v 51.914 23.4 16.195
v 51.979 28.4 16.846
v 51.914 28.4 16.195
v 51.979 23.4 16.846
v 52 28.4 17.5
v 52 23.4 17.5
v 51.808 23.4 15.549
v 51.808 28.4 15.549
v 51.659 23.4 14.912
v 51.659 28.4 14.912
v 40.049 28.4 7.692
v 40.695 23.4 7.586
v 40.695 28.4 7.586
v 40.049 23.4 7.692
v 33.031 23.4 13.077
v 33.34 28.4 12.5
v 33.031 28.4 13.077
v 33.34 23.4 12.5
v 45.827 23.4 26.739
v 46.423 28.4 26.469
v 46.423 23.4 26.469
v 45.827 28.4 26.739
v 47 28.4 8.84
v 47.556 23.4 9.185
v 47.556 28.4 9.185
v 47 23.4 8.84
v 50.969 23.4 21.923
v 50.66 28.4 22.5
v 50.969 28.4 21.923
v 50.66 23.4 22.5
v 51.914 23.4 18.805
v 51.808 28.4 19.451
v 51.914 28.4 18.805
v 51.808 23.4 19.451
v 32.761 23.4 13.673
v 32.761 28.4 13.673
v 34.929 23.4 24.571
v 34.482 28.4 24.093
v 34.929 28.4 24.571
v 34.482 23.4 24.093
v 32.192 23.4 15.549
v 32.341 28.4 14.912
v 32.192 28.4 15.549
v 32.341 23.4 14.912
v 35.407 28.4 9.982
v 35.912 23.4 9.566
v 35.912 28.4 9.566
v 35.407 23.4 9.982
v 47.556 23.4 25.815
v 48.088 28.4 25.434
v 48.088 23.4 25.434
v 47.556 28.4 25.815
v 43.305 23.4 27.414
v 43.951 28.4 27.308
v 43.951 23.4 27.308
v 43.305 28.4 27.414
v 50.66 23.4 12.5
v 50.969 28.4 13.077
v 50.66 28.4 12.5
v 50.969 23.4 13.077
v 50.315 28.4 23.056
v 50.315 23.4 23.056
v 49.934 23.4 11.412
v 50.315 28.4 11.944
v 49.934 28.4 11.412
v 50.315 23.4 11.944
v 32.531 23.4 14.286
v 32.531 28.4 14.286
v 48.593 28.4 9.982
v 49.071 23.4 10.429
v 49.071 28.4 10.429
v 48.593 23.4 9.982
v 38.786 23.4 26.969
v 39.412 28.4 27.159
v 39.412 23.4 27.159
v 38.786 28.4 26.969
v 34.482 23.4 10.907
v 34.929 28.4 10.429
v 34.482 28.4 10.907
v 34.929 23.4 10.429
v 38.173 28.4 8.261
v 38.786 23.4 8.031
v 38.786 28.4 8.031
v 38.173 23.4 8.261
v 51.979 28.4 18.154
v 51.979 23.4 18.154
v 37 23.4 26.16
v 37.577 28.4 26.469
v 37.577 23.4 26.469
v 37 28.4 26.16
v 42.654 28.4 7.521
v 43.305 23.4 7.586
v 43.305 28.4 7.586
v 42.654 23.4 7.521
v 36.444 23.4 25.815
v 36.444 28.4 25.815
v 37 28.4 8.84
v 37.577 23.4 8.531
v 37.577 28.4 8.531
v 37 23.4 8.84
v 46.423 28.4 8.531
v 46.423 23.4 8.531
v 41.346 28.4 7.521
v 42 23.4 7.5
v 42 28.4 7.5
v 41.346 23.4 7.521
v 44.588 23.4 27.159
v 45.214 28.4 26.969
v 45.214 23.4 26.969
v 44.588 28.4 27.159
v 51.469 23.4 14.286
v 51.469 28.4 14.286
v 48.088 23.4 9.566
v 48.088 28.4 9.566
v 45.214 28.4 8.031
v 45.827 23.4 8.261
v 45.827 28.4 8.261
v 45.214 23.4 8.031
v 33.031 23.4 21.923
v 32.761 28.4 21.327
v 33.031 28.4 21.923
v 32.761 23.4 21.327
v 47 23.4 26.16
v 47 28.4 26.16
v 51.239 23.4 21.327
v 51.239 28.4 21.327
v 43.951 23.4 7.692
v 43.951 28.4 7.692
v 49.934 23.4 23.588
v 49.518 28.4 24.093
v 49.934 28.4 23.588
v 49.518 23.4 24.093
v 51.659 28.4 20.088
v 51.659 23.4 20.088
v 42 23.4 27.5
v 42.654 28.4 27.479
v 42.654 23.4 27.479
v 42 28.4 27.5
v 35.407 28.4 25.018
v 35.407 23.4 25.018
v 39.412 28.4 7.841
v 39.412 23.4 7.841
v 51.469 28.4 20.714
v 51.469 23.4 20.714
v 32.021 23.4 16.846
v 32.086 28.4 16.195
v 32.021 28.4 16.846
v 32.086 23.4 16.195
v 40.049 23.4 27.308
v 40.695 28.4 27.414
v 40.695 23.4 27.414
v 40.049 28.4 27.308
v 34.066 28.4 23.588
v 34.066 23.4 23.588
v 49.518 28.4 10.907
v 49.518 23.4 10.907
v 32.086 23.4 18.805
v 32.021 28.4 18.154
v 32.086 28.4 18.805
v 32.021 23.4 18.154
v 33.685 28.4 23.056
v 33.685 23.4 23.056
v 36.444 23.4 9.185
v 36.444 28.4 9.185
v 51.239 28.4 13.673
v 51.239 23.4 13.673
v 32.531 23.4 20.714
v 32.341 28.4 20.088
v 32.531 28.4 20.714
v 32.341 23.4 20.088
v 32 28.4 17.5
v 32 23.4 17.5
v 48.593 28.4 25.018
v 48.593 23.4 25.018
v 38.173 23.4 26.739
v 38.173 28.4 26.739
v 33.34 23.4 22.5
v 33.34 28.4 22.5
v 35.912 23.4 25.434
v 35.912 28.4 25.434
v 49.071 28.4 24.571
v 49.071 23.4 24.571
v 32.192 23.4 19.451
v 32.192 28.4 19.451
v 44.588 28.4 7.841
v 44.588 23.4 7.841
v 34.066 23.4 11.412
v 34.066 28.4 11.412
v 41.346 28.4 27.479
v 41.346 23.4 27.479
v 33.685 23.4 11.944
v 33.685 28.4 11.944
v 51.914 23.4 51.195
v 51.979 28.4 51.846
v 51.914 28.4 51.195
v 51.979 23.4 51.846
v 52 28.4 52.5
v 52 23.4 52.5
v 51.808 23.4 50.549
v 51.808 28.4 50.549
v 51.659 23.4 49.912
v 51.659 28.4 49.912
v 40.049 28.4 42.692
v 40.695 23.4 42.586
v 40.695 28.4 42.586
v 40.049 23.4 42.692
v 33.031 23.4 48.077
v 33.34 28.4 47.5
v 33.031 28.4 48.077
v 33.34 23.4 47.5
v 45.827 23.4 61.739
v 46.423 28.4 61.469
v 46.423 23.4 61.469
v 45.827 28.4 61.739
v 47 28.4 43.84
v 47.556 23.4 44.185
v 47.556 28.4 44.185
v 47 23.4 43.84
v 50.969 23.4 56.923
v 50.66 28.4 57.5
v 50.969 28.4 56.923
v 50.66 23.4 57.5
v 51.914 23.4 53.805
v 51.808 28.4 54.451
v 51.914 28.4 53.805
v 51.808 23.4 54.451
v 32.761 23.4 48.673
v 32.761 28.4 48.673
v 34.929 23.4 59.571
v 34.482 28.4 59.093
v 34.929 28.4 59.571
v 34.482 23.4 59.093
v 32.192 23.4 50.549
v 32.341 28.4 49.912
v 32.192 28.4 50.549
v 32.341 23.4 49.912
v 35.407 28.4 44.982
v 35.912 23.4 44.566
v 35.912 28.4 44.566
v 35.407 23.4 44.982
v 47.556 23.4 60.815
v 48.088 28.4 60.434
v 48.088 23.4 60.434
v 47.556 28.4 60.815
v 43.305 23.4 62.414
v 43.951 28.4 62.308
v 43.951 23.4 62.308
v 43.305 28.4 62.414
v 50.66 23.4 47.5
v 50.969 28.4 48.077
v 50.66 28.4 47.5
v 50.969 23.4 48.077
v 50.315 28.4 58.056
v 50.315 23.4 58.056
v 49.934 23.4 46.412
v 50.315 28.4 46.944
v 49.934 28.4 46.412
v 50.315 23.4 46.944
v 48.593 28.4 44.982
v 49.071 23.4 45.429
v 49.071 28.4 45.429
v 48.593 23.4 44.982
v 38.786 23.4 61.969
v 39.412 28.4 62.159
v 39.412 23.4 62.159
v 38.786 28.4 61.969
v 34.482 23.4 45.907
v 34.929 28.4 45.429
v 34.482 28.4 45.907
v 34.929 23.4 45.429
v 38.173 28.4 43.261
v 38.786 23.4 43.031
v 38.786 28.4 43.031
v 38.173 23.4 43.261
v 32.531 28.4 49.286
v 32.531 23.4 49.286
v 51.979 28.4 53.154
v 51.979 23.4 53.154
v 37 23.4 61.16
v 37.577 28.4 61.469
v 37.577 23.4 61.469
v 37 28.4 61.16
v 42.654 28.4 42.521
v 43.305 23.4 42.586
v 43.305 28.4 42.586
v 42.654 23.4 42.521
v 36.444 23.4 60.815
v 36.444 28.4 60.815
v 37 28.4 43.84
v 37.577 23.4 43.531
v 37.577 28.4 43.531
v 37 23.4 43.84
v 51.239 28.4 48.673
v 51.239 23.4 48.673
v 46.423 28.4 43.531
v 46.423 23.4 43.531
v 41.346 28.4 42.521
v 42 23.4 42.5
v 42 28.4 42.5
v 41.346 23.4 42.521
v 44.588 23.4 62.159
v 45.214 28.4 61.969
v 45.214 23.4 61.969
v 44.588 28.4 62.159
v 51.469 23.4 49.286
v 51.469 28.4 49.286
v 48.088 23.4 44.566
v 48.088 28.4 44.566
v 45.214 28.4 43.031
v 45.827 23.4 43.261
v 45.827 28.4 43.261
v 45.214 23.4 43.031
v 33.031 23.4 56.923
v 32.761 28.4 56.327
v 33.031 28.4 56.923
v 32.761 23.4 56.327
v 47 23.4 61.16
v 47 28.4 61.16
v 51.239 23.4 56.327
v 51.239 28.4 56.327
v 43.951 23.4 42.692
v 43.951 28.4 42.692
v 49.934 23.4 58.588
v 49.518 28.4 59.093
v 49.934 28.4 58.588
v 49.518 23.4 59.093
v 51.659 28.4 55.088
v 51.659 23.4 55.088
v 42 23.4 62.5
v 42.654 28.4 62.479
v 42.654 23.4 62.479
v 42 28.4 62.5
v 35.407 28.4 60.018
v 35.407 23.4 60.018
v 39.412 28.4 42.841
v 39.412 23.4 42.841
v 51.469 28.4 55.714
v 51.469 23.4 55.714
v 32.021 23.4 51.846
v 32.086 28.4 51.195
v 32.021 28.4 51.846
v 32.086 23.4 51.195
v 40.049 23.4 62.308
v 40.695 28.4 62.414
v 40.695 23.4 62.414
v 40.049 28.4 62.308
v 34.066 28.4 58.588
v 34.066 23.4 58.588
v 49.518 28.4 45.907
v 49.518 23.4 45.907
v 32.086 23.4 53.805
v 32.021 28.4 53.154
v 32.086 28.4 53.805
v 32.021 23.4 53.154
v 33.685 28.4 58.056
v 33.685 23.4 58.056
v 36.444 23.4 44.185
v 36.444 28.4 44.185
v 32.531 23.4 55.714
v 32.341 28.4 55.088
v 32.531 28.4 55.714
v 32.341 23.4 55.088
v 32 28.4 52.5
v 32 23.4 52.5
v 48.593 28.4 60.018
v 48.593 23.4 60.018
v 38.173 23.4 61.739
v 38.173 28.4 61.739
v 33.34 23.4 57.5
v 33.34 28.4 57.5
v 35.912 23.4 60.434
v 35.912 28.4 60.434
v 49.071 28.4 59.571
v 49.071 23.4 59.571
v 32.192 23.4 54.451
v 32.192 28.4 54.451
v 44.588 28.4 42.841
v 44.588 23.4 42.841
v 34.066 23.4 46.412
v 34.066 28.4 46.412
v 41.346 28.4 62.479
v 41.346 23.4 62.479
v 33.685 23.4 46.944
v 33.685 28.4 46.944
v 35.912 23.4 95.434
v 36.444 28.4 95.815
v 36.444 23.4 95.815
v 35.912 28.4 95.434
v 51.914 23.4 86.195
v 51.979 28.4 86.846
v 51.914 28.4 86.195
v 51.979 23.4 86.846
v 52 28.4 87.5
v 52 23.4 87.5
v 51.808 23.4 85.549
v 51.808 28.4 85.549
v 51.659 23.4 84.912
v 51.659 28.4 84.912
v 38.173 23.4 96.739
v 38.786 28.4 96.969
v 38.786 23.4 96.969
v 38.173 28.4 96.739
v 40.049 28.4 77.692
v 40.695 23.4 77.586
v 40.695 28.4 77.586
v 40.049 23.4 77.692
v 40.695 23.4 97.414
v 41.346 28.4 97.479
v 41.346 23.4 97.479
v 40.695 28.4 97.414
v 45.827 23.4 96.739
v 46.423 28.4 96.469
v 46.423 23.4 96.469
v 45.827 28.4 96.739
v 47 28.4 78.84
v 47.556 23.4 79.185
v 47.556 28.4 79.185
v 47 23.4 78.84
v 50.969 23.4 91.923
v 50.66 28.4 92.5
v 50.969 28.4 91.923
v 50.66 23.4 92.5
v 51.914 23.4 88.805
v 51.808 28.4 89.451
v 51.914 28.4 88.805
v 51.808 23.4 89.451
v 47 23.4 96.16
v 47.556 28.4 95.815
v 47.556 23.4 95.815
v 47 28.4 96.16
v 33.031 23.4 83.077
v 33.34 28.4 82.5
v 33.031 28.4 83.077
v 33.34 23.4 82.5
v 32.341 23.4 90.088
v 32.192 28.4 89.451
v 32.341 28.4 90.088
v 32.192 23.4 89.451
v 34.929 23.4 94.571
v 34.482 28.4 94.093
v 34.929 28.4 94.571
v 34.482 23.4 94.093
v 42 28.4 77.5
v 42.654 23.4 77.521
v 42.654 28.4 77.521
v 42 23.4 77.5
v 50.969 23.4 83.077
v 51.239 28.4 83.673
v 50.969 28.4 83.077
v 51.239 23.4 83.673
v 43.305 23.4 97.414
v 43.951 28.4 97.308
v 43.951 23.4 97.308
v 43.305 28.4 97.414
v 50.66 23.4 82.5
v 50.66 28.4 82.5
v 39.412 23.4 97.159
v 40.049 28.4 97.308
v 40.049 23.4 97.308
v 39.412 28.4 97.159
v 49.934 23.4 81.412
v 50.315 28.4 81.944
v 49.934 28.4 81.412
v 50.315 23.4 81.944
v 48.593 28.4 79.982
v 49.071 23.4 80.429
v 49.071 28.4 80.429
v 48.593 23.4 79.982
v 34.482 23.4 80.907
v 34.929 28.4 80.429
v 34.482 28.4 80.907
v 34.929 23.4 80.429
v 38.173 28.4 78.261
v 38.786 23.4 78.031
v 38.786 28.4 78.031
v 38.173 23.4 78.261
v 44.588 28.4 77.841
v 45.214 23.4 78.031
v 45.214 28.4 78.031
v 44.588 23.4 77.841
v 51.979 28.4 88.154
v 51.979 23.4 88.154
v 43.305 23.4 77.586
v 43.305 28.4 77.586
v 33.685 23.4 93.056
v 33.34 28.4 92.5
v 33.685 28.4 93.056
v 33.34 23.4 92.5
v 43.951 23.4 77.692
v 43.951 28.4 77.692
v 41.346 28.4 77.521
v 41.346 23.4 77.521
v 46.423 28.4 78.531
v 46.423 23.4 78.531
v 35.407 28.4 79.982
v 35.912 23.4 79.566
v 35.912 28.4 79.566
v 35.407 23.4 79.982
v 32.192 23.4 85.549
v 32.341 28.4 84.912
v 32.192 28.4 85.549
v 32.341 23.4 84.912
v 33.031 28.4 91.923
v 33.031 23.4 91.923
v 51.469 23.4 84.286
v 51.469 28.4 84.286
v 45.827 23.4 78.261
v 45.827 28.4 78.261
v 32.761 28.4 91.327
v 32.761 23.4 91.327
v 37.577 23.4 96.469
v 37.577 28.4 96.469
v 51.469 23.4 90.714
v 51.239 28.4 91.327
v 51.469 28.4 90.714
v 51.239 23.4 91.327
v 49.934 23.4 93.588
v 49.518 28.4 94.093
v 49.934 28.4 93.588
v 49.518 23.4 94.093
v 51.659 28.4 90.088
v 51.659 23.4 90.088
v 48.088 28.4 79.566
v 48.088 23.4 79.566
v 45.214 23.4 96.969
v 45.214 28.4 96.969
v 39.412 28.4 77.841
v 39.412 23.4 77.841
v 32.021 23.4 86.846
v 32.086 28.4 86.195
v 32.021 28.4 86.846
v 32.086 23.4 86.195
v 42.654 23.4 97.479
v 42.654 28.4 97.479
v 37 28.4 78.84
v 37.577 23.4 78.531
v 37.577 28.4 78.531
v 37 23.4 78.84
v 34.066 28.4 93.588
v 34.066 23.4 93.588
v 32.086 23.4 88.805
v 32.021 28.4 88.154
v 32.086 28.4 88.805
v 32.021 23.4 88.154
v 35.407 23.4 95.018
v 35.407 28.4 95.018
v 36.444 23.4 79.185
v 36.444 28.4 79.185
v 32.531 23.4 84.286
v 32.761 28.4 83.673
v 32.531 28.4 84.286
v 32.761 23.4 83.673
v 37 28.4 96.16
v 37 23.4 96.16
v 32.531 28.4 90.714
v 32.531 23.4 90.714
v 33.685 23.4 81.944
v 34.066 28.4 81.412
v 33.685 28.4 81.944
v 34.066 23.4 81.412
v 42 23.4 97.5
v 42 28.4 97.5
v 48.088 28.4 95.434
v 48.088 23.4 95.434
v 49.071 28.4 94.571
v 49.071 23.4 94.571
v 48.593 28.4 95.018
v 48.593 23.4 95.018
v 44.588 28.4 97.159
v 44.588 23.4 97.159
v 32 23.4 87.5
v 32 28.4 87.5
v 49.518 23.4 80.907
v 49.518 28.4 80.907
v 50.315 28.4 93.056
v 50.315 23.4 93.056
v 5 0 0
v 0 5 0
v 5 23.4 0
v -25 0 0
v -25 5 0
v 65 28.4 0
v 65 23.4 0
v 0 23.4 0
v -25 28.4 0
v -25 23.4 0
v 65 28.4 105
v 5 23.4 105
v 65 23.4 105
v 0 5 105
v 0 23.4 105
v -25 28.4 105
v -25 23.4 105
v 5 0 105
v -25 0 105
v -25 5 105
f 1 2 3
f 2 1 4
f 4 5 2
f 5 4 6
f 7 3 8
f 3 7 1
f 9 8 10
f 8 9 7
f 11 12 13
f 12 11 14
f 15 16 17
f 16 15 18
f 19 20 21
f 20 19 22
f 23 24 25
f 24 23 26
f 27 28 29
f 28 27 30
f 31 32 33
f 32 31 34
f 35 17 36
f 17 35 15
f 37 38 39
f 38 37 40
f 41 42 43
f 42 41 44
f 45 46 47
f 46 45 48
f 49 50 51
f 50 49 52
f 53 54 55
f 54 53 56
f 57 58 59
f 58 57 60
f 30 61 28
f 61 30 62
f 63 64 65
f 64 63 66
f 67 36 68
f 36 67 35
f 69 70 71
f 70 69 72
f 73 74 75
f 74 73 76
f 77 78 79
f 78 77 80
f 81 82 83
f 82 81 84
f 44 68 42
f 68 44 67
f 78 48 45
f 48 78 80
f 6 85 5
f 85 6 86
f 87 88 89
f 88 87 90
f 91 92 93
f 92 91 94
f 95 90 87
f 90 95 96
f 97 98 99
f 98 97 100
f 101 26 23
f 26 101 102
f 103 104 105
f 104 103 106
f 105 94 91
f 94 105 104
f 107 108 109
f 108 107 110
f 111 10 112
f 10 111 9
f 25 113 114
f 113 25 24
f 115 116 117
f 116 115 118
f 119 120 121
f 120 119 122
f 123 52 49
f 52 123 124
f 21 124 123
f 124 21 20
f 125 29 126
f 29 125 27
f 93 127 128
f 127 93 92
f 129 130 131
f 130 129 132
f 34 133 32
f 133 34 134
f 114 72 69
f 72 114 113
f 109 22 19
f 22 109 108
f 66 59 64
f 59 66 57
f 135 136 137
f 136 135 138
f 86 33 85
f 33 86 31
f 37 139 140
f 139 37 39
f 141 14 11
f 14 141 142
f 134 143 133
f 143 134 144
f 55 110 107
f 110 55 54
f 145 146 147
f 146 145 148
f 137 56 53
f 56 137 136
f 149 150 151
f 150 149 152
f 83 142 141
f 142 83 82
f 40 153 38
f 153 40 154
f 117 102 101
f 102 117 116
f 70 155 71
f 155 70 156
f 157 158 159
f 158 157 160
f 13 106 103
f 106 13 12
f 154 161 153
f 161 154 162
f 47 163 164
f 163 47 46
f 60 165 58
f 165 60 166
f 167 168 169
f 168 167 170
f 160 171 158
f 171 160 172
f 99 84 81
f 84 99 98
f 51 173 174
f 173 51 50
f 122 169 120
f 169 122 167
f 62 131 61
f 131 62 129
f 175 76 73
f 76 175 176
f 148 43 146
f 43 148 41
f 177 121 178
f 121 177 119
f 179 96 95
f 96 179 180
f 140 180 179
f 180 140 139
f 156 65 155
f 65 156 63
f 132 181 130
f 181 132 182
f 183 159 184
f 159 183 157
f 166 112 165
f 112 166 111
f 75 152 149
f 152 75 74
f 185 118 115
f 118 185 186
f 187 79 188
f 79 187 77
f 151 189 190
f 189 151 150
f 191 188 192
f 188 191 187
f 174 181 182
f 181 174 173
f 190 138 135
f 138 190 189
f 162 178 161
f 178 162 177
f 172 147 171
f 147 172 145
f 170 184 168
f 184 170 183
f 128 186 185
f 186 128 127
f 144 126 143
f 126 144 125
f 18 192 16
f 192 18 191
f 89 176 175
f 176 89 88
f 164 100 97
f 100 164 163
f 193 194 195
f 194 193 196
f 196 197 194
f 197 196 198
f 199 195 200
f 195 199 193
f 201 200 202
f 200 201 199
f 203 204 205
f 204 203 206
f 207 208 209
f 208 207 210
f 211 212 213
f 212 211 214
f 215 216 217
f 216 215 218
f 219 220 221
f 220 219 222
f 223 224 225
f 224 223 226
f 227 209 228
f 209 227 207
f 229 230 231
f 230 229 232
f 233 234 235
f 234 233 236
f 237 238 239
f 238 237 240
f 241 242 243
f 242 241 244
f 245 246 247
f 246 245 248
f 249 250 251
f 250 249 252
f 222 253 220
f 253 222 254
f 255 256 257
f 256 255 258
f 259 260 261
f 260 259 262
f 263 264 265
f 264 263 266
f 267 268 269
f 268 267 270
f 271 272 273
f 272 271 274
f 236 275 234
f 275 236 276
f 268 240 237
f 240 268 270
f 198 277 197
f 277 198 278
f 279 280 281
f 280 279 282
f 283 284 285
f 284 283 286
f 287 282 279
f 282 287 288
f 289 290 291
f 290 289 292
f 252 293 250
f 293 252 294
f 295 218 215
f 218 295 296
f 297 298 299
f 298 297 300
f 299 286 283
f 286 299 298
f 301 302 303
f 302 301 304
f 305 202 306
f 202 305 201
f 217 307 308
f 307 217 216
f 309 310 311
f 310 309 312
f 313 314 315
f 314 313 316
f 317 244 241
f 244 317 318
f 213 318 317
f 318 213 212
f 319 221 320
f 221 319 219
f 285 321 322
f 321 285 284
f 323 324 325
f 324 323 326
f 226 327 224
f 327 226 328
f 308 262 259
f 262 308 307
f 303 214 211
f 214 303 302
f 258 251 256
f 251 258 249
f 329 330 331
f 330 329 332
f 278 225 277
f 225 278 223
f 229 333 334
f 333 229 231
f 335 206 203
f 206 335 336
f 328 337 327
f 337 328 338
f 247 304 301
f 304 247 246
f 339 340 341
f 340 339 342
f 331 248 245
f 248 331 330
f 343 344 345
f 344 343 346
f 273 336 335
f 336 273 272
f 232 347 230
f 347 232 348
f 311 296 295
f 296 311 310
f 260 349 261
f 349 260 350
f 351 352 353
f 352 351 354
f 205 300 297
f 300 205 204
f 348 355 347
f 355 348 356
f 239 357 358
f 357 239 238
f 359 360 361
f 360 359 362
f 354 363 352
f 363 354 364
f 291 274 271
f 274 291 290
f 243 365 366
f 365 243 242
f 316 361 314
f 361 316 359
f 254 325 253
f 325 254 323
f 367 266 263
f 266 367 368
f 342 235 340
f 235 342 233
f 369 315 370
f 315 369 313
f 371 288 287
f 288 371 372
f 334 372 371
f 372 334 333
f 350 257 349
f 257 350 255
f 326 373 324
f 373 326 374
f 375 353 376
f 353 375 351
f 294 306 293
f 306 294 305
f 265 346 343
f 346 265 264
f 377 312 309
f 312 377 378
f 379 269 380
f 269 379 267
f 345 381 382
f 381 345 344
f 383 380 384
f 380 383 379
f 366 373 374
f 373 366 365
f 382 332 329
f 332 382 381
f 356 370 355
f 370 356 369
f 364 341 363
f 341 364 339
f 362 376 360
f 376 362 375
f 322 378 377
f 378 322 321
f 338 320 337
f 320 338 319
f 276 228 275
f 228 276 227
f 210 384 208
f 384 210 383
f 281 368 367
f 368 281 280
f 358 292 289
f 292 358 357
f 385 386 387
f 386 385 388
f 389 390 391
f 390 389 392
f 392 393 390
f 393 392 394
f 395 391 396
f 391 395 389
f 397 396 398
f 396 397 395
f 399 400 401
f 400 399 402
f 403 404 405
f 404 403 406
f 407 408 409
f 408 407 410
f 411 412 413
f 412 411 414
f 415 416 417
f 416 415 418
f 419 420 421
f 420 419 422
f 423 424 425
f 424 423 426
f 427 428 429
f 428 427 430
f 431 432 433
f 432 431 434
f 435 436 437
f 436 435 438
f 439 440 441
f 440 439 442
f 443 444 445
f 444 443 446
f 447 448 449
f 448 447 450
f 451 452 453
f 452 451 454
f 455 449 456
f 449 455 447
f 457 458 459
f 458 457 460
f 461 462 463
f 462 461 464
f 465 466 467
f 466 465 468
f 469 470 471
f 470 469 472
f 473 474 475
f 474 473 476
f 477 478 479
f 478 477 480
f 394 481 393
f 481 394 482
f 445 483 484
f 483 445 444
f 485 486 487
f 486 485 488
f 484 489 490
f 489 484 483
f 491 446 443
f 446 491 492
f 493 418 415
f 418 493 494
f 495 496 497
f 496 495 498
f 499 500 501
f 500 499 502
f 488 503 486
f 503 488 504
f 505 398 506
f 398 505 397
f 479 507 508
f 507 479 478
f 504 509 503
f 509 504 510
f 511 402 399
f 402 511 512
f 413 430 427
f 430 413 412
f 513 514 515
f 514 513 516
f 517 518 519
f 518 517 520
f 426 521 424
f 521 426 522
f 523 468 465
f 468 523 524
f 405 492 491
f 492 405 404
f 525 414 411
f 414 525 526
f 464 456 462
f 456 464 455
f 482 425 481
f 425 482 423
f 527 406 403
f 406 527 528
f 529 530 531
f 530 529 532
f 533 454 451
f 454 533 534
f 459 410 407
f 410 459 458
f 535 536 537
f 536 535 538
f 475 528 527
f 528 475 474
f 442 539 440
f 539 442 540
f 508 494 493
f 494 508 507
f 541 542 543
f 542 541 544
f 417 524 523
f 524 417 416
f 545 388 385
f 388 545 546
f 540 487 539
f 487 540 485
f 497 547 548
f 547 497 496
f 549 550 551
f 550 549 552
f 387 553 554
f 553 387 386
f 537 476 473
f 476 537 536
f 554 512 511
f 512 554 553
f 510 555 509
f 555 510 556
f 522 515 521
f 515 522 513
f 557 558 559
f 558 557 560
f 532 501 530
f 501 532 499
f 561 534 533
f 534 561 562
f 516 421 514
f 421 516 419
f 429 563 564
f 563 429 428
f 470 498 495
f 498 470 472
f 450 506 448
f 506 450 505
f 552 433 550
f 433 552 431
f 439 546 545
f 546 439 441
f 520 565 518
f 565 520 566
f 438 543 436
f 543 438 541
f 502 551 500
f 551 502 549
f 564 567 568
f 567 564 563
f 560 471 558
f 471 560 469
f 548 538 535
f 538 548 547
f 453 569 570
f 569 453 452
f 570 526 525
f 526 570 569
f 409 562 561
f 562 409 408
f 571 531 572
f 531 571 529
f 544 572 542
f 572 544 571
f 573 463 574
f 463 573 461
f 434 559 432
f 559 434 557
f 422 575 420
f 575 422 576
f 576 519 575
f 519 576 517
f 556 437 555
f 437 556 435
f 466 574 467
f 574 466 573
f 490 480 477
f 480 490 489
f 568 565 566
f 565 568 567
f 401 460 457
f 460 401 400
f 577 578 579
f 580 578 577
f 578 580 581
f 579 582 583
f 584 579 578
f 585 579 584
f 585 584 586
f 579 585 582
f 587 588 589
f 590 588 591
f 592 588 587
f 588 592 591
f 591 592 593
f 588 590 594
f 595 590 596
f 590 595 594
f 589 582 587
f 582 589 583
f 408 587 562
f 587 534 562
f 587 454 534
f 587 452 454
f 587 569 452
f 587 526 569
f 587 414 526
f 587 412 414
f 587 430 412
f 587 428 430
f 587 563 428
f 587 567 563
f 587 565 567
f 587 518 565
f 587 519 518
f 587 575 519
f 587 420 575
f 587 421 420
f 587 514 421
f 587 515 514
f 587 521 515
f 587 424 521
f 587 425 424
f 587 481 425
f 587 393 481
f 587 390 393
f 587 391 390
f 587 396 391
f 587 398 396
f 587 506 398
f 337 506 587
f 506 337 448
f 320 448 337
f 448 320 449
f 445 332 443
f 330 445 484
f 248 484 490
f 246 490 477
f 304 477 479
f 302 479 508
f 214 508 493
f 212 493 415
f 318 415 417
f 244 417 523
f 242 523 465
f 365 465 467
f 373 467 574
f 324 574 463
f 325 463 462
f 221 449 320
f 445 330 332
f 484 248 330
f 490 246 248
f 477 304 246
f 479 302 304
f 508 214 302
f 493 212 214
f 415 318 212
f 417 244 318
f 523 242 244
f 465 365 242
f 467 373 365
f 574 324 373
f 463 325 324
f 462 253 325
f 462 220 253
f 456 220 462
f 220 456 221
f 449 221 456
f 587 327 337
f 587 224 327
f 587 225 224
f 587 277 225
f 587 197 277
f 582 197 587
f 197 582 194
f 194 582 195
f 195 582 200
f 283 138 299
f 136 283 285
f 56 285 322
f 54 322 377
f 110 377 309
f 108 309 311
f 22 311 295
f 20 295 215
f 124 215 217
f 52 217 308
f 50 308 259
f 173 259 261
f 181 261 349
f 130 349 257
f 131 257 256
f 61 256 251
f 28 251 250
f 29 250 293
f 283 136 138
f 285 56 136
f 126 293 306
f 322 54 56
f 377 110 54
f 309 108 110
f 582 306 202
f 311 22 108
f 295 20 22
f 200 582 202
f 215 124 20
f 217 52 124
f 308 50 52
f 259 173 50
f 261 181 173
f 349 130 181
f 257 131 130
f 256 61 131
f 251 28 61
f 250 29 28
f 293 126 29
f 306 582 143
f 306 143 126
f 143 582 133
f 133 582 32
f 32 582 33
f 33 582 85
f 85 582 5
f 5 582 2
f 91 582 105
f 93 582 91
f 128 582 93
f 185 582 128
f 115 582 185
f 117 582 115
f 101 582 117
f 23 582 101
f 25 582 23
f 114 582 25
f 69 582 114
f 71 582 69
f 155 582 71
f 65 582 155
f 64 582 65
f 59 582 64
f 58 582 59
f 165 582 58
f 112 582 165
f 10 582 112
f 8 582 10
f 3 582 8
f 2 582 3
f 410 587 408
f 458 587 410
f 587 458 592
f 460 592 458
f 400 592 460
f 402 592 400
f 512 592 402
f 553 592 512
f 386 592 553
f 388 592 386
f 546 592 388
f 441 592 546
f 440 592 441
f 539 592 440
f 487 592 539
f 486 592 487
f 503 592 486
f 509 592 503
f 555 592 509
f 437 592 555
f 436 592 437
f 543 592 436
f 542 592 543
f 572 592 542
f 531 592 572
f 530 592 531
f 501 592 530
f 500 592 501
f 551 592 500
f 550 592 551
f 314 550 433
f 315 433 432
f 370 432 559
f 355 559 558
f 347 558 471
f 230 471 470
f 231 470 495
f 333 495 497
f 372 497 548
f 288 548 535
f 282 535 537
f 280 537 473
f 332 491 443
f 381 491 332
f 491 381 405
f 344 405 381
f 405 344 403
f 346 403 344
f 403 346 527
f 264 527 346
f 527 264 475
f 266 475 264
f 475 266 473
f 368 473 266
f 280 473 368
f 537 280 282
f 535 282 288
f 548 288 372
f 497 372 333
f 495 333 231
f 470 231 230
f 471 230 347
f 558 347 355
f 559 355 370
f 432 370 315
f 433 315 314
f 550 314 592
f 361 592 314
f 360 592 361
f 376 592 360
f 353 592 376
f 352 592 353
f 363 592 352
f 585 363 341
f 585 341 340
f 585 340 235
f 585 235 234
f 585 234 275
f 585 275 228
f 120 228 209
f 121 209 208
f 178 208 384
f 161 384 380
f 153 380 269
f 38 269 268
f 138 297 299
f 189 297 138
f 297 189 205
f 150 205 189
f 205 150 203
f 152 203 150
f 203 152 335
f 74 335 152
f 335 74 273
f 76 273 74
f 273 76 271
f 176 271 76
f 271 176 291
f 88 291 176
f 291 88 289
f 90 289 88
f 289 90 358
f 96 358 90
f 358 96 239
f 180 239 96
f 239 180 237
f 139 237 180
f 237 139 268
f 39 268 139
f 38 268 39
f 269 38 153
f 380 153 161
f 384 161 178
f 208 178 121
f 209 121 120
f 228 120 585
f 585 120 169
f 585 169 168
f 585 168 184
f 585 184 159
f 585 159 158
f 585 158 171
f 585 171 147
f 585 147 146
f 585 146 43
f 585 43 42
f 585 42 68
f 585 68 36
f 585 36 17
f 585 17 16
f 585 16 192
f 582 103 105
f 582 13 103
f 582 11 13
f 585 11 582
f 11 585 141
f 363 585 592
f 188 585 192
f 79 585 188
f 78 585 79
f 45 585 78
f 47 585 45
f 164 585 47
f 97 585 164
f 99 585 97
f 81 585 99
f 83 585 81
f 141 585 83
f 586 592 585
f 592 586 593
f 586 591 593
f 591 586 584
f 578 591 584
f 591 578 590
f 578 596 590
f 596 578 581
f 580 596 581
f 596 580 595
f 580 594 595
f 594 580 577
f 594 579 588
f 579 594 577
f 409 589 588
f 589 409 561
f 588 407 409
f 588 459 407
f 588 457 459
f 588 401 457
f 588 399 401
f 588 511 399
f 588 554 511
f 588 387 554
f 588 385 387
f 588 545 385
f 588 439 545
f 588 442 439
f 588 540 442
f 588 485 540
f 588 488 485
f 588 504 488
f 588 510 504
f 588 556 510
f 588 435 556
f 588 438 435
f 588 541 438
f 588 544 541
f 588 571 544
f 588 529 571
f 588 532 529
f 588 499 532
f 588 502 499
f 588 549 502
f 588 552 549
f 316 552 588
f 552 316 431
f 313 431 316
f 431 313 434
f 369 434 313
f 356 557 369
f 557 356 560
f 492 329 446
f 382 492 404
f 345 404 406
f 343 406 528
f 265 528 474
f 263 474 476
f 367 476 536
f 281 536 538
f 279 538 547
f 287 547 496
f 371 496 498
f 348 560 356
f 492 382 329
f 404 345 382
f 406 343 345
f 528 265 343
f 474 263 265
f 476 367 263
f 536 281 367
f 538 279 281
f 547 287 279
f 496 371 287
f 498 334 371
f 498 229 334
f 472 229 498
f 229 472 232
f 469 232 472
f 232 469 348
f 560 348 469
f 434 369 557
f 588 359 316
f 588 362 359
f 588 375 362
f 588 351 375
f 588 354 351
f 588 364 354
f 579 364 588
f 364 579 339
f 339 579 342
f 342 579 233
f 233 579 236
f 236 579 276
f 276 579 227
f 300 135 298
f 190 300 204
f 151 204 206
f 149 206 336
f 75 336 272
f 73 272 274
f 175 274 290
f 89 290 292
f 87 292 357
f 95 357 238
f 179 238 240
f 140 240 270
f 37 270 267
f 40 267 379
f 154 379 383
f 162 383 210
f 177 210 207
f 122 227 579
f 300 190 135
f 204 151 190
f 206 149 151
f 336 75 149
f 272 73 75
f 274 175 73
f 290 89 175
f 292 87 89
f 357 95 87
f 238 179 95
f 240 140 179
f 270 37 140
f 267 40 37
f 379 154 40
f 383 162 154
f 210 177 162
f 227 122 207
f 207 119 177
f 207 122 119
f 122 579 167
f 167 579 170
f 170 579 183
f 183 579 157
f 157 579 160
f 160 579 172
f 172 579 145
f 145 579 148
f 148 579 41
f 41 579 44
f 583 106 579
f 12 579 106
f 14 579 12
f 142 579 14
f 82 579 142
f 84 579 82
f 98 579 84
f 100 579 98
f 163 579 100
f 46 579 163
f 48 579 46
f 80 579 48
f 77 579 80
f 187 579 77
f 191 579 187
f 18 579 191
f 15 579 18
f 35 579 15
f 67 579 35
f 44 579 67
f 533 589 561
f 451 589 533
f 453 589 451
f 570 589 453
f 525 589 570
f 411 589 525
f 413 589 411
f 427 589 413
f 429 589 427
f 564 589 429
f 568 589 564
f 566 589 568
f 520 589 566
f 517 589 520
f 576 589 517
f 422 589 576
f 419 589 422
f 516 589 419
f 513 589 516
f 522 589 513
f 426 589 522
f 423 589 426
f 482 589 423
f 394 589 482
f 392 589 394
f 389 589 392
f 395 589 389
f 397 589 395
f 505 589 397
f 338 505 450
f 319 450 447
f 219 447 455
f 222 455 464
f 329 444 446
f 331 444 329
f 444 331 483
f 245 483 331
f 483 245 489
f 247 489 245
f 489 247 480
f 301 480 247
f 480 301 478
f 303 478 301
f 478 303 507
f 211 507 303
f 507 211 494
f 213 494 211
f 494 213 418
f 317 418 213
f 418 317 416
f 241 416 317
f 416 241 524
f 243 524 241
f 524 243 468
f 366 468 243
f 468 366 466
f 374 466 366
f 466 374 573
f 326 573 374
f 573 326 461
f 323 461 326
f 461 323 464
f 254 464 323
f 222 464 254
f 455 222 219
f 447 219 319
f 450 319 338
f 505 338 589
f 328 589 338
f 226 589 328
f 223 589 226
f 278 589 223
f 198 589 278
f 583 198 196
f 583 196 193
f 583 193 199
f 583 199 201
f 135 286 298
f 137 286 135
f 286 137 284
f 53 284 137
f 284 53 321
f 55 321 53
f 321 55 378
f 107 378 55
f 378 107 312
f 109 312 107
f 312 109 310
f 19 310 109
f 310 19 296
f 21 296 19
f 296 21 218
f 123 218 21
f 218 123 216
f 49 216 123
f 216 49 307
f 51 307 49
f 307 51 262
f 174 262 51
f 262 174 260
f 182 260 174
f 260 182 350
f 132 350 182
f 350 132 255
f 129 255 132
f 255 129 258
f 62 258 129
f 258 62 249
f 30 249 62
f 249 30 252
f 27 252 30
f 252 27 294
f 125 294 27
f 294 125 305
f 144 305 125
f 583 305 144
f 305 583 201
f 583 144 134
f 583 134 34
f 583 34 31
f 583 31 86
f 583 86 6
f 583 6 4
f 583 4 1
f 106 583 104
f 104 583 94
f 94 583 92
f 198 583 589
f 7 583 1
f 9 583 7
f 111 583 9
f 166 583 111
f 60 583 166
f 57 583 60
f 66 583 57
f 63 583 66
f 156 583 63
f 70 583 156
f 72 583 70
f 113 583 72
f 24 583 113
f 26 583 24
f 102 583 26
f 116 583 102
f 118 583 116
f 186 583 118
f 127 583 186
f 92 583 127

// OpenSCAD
// Pipette holder: shelf-edge clamp with arm, printed on its side
// Profile in XY, extruded along Z. In use: +Y up, +X away from the shelf.

$fn = 64;

// --- Dimensions (mm) ---
length_z      = 105;    // extrusion length along Z
spine_x0      = 0;      // spine start X
spine_x1      = 5;      // spine end X
spine_y0      = 0;      // spine start Y
spine_y1      = 28.4;   // spine end Y
jaw_x0        = -25;    // jaw back end X
bot_jaw_y0    = 0;      // bottom jaw bottom Y
bot_jaw_y1    = 5;      // bottom jaw top Y
top_jaw_y0    = 23.4;   // top jaw/arm bottom Y
top_jaw_y1    = 28.4;   // top jaw/arm top Y
arm_x1        = 65;     // arm front end X
hole_d        = 20;     // pipette hole diameter
hole_x        = 42;     // hole centre X
hole_z        = [17.5, 52.5, 87.5]; // hole centre Z positions
cut_margin    = 1;      // cutter overshoot past faces

difference() {
    // Clamp profile extruded along Z
    linear_extrude(height = length_z)
        union() {
            // spine
            translate([spine_x0, spine_y0])
                square([spine_x1 - spine_x0, spine_y1 - spine_y0]);
            // bottom jaw
            translate([jaw_x0, bot_jaw_y0])
                square([spine_x1 - jaw_x0, bot_jaw_y1 - bot_jaw_y0]);
            // top jaw and arm
            translate([jaw_x0, top_jaw_y0])
                square([arm_x1 - jaw_x0, top_jaw_y1 - top_jaw_y0]);
        }

    // Pipette holes through the arm along Y
    for (z = hole_z)
        translate([hole_x, top_jaw_y0 - cut_margin, z])
            rotate([-90, 0, 0])
                cylinder(d = hole_d,
                         h = (top_jaw_y1 - top_jaw_y0) + 2 * cut_margin,
                         $fn = 96);
}
